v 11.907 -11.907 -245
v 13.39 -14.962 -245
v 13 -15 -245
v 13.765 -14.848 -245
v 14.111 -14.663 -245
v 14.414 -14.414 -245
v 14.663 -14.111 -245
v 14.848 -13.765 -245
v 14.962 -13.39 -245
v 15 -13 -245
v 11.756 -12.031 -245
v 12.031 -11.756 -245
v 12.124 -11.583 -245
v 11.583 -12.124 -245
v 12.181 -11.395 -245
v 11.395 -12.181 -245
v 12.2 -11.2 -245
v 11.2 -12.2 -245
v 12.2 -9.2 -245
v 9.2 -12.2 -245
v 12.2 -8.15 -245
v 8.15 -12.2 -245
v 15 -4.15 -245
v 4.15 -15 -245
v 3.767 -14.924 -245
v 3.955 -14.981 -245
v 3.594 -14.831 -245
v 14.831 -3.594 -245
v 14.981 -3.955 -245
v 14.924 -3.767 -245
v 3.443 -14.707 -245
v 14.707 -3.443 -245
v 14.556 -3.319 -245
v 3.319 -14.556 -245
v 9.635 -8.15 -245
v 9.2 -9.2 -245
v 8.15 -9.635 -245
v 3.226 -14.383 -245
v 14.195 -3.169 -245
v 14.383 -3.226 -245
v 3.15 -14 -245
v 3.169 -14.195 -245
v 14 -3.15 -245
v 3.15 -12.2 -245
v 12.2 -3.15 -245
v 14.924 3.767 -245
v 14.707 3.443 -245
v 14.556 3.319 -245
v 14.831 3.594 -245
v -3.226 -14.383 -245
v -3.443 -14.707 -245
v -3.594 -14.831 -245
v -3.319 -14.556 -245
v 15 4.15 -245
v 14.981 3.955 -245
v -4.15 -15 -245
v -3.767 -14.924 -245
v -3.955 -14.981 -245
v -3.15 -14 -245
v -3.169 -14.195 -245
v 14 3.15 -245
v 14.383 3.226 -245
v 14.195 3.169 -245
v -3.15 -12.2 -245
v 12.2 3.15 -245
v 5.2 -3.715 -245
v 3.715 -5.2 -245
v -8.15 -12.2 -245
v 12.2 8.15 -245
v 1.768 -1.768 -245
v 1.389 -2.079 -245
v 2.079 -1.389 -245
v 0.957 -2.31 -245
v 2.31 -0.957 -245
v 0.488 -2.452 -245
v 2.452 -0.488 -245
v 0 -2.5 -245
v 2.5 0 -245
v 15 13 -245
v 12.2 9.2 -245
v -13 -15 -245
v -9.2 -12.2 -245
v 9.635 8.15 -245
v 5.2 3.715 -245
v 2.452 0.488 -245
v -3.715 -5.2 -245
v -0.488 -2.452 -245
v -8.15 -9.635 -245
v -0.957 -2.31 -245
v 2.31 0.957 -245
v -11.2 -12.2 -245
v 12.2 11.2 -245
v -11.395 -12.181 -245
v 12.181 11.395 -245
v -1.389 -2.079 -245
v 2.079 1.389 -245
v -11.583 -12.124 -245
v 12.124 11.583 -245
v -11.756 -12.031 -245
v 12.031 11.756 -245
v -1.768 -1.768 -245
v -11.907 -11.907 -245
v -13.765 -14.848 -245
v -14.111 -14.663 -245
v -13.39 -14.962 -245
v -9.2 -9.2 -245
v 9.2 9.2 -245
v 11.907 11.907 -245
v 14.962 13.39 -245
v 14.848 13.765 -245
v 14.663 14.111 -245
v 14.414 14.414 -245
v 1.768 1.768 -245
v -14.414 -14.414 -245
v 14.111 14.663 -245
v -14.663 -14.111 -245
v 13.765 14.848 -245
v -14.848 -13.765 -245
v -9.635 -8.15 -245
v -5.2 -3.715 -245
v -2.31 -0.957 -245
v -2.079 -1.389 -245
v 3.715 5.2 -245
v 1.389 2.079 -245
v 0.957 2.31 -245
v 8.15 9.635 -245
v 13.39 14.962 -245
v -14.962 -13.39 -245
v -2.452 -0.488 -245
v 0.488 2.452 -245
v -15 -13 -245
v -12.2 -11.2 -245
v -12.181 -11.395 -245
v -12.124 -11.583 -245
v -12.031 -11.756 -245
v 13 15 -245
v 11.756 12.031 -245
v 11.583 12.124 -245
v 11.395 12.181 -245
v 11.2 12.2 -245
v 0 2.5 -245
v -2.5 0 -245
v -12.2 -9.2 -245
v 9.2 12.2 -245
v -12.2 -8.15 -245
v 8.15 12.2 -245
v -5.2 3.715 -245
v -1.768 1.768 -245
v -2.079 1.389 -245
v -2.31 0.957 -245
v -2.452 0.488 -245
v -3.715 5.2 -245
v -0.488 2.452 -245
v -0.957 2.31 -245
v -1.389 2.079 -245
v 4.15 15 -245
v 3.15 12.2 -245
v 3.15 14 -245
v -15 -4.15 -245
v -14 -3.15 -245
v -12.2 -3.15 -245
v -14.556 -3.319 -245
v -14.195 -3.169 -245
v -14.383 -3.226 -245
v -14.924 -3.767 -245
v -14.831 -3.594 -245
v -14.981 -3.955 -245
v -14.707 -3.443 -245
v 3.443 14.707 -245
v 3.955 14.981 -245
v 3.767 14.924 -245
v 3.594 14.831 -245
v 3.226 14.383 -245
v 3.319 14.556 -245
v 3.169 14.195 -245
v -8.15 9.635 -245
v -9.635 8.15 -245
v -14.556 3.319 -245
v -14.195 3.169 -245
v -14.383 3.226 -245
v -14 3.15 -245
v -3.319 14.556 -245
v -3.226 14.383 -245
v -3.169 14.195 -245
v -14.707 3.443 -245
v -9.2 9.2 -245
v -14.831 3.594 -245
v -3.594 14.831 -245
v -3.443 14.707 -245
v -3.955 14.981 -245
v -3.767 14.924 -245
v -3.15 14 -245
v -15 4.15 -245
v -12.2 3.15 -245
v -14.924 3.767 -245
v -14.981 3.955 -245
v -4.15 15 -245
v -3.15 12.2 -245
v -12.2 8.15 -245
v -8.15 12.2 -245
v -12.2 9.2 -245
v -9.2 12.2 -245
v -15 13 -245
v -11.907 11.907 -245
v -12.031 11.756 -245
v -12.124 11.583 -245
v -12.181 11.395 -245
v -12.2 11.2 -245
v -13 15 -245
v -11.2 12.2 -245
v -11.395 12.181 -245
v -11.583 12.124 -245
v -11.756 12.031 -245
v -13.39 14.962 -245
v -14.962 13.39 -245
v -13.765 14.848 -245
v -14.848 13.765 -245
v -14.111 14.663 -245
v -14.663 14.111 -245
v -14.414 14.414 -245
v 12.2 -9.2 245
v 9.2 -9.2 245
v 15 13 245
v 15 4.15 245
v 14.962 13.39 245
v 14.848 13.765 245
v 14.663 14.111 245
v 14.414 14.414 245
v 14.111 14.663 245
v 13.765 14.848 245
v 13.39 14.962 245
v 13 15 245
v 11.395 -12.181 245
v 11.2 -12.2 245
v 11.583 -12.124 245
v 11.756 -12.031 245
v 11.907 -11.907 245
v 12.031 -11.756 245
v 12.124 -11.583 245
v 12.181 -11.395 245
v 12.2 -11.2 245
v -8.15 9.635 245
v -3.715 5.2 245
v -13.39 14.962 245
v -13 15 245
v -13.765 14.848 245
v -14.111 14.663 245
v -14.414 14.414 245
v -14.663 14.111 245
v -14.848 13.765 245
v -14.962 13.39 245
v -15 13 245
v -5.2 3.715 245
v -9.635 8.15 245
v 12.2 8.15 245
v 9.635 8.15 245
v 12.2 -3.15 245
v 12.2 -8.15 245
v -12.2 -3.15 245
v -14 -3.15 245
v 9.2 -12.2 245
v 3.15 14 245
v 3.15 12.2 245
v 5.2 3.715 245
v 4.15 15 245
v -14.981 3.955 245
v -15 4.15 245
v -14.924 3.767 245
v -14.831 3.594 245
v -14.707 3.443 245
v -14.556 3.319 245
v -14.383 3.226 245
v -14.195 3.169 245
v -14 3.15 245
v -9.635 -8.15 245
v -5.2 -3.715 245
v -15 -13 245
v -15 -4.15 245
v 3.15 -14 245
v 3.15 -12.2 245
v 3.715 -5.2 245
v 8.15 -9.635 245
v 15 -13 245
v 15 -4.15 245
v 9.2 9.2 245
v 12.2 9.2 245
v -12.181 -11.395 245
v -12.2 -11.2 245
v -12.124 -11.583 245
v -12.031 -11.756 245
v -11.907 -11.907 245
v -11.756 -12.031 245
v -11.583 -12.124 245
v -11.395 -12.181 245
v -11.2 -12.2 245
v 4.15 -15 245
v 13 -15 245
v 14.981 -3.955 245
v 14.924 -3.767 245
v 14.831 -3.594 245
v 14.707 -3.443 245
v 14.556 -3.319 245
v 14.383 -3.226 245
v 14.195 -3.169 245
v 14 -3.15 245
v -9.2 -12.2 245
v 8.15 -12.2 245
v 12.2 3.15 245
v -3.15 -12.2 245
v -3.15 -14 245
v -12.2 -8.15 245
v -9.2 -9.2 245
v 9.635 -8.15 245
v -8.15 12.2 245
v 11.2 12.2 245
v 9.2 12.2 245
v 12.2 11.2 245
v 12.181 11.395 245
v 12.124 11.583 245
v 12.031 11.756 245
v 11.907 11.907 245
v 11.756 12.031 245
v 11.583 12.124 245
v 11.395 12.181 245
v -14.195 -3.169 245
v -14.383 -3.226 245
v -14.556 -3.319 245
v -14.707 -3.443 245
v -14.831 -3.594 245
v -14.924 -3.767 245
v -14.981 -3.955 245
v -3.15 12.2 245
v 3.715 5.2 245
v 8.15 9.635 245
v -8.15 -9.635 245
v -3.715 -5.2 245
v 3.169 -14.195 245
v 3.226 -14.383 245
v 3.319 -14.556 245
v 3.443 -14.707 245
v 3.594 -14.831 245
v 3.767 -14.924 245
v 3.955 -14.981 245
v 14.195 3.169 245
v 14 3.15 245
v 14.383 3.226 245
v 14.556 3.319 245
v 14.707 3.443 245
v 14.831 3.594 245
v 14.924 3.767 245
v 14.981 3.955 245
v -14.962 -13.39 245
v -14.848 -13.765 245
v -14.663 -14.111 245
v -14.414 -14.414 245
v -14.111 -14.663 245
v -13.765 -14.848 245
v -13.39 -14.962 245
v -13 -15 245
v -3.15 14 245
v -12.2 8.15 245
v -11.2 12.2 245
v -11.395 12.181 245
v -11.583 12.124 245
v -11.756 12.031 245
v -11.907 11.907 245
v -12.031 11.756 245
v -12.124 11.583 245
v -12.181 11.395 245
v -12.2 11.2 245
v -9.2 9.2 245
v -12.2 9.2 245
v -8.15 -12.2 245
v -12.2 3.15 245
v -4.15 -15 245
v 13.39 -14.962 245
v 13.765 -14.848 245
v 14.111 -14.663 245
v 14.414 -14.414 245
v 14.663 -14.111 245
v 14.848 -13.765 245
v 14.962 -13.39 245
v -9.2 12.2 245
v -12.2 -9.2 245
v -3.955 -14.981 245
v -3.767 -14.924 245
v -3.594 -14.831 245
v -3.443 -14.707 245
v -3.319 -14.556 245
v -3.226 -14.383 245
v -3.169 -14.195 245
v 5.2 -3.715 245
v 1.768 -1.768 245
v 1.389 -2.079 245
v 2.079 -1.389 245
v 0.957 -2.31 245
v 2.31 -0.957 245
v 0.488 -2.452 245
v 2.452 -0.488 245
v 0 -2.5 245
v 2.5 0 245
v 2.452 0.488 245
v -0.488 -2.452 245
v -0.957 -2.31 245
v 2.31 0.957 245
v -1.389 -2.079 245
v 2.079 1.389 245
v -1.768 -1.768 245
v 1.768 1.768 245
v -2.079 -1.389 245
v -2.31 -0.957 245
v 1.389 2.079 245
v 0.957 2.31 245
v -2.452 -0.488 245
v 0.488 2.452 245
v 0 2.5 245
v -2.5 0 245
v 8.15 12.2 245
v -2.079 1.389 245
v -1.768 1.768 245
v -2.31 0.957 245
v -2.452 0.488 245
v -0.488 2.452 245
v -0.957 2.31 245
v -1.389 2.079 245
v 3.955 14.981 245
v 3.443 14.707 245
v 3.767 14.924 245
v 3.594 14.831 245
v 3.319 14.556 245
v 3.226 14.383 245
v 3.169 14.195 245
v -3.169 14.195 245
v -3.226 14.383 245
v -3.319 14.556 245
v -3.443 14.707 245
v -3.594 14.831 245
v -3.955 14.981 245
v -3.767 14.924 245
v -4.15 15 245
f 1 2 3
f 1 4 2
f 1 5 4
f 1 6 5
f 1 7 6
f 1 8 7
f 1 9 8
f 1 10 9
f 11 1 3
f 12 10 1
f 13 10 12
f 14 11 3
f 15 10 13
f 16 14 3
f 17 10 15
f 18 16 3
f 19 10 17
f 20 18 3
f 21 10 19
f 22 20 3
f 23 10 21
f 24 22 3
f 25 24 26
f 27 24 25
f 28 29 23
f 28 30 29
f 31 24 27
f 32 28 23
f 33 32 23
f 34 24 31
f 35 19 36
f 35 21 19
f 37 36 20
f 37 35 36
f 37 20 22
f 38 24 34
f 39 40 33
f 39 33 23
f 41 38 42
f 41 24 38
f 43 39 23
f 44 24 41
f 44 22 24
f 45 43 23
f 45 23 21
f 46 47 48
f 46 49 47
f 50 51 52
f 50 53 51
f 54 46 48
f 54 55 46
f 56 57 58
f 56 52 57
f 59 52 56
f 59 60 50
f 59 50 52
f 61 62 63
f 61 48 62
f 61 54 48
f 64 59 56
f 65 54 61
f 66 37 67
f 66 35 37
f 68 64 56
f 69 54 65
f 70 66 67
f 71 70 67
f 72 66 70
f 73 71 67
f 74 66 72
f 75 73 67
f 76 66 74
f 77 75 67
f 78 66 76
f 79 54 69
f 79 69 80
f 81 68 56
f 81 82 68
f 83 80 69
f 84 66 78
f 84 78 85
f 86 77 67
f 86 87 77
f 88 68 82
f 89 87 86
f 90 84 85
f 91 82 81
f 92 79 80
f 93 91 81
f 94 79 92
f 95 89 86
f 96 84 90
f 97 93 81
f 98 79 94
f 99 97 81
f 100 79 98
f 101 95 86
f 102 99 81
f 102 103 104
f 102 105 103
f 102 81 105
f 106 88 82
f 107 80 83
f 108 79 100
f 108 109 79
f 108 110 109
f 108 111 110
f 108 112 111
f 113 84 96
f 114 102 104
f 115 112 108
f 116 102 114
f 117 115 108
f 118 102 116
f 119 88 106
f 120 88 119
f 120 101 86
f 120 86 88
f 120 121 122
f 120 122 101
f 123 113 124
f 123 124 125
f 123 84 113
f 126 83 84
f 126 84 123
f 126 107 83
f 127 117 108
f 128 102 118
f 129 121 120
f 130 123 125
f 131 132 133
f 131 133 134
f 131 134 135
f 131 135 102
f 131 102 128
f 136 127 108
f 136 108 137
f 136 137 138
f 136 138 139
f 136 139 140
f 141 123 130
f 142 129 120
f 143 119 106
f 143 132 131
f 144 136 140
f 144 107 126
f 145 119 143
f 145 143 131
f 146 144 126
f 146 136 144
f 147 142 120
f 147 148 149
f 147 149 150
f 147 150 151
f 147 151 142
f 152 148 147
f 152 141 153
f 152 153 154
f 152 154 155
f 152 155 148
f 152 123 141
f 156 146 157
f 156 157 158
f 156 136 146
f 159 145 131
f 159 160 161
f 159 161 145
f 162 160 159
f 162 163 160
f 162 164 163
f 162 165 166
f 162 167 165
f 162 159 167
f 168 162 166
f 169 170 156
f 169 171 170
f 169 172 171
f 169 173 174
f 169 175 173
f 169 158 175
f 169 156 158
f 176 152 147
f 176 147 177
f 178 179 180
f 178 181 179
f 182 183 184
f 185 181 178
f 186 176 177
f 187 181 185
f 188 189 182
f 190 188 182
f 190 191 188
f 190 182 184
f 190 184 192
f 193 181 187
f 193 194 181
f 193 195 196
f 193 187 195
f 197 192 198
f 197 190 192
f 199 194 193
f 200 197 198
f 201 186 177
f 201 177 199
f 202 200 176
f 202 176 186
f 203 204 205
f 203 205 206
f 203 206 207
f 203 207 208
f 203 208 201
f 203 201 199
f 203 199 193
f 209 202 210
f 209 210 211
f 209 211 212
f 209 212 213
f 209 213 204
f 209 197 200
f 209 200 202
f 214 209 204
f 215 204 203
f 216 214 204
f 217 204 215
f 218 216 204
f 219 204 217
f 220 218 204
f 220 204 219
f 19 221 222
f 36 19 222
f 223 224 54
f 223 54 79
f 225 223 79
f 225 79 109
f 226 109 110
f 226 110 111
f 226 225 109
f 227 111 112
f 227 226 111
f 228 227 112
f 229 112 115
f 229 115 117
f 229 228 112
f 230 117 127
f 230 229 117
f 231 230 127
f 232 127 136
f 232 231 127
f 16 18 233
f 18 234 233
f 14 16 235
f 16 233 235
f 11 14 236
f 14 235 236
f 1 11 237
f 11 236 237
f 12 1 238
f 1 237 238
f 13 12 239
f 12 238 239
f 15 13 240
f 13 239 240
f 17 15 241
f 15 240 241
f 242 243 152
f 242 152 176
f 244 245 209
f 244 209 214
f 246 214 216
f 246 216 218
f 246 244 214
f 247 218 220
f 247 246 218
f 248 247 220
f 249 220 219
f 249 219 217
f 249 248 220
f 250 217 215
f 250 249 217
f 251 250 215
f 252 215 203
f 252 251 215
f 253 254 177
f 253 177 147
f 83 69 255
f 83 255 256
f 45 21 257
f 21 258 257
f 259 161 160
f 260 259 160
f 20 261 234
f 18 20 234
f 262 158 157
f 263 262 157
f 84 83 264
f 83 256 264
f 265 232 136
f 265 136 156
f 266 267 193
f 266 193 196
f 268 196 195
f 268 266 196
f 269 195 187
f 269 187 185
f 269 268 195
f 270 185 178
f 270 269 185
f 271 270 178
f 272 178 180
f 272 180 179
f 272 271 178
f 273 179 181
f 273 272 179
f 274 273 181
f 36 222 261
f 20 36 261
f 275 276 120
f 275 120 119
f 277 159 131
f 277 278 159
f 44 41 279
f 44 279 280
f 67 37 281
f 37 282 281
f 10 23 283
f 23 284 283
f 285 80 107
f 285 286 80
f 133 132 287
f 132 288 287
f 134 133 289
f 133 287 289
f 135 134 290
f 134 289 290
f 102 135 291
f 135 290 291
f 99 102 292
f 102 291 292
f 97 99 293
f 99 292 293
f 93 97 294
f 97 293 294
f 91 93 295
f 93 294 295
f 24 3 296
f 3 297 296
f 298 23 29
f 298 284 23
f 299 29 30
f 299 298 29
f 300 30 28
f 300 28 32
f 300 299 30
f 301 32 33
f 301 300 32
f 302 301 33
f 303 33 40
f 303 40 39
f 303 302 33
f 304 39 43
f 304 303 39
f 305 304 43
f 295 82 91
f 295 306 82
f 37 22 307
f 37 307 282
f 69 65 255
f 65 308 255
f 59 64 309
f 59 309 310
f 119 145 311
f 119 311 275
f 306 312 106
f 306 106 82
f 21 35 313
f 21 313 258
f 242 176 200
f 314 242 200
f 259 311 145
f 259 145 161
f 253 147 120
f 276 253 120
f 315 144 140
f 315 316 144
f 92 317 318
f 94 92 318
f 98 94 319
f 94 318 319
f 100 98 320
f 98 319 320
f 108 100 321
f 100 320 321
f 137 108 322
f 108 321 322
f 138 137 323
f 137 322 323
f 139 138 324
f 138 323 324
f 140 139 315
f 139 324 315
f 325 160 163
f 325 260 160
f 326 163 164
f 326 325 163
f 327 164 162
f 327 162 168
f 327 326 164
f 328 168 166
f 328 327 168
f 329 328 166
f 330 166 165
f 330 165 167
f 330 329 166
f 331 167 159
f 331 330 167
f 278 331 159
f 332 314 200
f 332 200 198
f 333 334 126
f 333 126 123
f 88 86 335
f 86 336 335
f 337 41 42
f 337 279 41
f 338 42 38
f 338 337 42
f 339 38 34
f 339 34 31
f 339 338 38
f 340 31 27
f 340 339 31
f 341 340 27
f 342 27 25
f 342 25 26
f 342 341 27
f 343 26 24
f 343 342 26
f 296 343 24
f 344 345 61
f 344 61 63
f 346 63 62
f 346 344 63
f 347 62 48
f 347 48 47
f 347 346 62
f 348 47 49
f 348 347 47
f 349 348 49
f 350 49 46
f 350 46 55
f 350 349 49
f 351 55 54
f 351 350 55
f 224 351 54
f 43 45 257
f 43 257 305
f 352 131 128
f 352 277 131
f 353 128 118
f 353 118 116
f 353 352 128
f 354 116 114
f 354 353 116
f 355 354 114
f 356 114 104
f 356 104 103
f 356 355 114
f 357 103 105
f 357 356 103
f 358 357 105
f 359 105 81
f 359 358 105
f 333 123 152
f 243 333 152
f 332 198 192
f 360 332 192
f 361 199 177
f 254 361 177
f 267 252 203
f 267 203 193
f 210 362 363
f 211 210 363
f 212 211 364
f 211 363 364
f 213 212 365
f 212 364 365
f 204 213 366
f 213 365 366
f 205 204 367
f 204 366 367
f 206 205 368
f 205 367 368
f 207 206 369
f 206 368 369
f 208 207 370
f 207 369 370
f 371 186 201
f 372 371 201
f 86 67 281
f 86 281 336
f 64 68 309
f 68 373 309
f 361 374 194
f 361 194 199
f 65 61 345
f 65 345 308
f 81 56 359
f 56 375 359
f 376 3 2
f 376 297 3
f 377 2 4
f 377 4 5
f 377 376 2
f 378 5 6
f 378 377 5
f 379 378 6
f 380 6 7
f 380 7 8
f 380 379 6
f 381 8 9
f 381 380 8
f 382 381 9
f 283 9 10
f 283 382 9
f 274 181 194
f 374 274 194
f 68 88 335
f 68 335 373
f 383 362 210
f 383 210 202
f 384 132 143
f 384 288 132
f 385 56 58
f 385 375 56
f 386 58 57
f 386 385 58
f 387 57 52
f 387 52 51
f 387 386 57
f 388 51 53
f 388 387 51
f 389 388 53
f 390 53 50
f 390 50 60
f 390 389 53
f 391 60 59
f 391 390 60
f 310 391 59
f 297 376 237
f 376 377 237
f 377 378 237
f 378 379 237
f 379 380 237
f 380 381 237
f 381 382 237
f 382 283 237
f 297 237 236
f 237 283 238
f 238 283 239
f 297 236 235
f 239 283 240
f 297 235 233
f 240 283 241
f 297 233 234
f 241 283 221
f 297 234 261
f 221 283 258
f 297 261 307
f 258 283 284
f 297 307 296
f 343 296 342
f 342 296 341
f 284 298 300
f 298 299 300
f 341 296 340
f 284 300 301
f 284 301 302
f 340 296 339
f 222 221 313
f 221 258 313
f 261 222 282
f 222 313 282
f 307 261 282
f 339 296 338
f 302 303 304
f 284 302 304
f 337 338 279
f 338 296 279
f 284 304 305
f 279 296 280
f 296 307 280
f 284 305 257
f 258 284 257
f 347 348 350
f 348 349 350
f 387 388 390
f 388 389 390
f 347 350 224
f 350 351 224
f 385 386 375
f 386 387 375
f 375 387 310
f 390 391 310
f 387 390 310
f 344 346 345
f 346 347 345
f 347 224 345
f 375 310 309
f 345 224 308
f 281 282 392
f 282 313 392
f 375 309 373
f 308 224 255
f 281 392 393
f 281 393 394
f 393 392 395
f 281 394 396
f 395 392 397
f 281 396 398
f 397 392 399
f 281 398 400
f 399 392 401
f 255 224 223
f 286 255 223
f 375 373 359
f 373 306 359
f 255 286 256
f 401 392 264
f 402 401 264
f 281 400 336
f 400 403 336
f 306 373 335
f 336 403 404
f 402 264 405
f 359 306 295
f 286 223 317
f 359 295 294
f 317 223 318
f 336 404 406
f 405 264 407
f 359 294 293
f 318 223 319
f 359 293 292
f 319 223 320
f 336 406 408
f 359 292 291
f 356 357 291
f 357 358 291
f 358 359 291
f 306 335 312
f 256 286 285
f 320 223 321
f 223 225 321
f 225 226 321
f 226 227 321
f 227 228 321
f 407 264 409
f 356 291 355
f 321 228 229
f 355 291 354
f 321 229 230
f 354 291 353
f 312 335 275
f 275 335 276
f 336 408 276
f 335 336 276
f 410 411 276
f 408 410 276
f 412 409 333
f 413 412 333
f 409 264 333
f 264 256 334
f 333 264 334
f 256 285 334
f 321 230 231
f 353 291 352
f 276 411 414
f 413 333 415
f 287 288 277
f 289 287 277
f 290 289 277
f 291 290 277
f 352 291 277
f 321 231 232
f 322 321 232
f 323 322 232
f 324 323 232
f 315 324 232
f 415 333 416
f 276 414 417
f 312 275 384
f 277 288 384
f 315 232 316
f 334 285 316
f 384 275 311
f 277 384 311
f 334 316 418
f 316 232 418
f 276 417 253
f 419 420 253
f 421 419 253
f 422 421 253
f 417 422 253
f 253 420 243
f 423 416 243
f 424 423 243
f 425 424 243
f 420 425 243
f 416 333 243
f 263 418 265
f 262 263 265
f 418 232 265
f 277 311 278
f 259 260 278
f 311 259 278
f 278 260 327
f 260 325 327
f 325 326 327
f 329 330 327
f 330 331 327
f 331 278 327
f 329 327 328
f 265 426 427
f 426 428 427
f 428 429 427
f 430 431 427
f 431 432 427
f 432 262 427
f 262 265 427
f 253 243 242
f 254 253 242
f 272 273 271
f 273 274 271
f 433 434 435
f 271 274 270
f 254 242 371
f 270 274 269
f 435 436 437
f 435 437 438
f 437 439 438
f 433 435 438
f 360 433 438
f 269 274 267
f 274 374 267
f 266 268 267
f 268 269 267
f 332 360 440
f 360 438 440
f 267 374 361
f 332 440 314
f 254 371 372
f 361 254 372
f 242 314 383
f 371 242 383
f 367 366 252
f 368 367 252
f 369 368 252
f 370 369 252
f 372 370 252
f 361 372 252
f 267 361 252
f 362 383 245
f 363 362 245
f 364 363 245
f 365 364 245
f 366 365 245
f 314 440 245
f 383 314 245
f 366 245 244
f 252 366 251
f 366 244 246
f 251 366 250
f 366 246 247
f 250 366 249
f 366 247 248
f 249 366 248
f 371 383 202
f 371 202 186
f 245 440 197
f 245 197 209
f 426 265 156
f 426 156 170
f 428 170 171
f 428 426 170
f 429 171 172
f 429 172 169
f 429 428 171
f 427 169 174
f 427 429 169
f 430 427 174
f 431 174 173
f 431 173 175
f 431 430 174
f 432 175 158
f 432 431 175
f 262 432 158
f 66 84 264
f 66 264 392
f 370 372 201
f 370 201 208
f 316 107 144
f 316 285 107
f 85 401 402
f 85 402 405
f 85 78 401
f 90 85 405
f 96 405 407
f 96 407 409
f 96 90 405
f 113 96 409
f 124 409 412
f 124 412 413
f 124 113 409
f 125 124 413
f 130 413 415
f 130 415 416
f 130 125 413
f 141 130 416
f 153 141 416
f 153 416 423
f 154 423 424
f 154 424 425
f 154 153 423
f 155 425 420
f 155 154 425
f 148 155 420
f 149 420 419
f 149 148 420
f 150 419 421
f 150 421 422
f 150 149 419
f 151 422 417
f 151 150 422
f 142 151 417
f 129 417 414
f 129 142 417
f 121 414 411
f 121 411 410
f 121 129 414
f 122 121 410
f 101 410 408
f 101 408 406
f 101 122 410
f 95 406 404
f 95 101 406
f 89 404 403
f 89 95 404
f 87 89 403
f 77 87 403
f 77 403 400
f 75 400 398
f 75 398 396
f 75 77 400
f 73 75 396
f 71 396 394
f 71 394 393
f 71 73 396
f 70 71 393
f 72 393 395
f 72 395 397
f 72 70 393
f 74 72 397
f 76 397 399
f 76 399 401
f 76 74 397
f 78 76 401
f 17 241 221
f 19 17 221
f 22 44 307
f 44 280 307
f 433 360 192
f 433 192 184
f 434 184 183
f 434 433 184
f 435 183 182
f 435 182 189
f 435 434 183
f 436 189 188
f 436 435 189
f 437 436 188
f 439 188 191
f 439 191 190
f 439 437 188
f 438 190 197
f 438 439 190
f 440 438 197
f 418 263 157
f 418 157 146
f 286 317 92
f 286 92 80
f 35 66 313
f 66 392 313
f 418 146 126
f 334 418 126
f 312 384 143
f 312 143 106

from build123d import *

# Parameters (mm, degrees)
SKETCH_R  = 2.5
PAD_DEPTH = 245


with BuildPart() as part:
    # Sketch → Pad (new body, symmetric)
    with BuildSketch(Plane.XY):
        with BuildLine():
            Line((14, 3.15), (12.2, 3.15))
            Line((12.2, 3.15), (12.2, 8.15))
            Line((12.2, 8.15), (9.634924, 8.15))
            Line((9.634924, 8.15), (5.2, 3.715076))
            Line((5.2, 3.715076), (5.2, -3.715076))
            Line((5.2, -3.715076), (9.634924, -8.15))
            Line((9.634924, -8.15), (12.2, -8.15))
            Line((12.2, -8.15), (12.2, -3.15))
            Line((12.2, -3.15), (14, -3.15))
            ThreePointArc((15, -4.15), (14.707107, -3.442893), (14, -3.15))
            Line((15, -4.15), (15, -13))
            ThreePointArc((13, -15), (14.414214, -14.414214), (15, -13))
            Line((13, -15), (4.15, -15))
            ThreePointArc((3.15, -14), (3.442893, -14.707107), (4.15, -15))
            Line((3.15, -14), (3.15, -12.2))
            Line((3.15, -12.2), (8.15, -12.2))
            Line((8.15, -12.2), (8.15, -9.634924))
            Line((8.15, -9.634924), (3.715076, -5.2))
            Line((3.715076, -5.2), (-3.715076, -5.2))
            Line((-3.715076, -5.2), (-8.15, -9.634924))
            Line((-8.15, -9.634924), (-8.15, -12.2))
            Line((-8.15, -12.2), (-3.15, -12.2))
            Line((-3.15, -12.2), (-3.15, -14))
            ThreePointArc((-4.15, -15), (-3.442893, -14.707107), (-3.15, -14))
            Line((-4.15, -15), (-13, -15))
            ThreePointArc((-15, -13), (-14.414214, -14.414214), (-13, -15))
            Line((-15, -4.15), (-15, -13))
            ThreePointArc((-14, -3.15), (-14.707107, -3.442893), (-15, -4.15))
            Line((-12.2, -3.15), (-14, -3.15))
            Line((-12.2, -8.15), (-12.2, -3.15))
            Line((-12.2, -8.15), (-9.634924, -8.15))
            Line((-5.2, -3.715076), (-9.634924, -8.15))
            Line((-5.2, 3.715076), (-5.2, -3.715076))
            Line((-9.634924, 8.15), (-5.2, 3.715076))
            Line((-12.2, 8.15), (-9.634924, 8.15))
            Line((-12.2, 3.15), (-12.2, 8.15))
            Line((-14, 3.15), (-12.2, 3.15))
            ThreePointArc((-15, 4.15), (-14.707107, 3.442893), (-14, 3.15))
            Line((-15, 13), (-15, 4.15))
            ThreePointArc((-13, 15), (-14.414214, 14.414214), (-15, 13))
            Line((-4.15, 15), (-13, 15))
            ThreePointArc((-3.15, 14), (-3.442893, 14.707107), (-4.15, 15))
            Line((-3.15, 12.2), (-3.15, 14))
            Line((-8.15, 12.2), (-3.15, 12.2))
            Line((-8.15, 9.634924), (-8.15, 12.2))
            Line((-3.715076, 5.2), (-8.15, 9.634924))
            Line((3.715076, 5.2), (-3.715076, 5.2))
            Line((8.15, 9.634924), (3.715076, 5.2))
            Line((8.15, 12.2), (8.15, 9.634924))
            Line((3.15, 12.2), (8.15, 12.2))
            Line((3.15, 14), (3.15, 12.2))
            ThreePointArc((4.15, 15), (3.442893, 14.707107), (3.15, 14))
            Line((13, 15), (4.15, 15))
            ThreePointArc((15, 13), (14.414214, 14.414214), (13, 15))
            Line((15, 4.15), (15, 13))
            ThreePointArc((14, 3.15), (14.707107, 3.442893), (15, 4.15))
        make_face()
        Circle(SKETCH_R, mode=Mode.SUBTRACT)
        with BuildLine():
            Line((9.2, 12.2), (11.2, 12.2))
            ThreePointArc((12.2, 11.2), (11.907107, 11.907107), (11.2, 12.2))
            Line((12.2, 11.2), (12.2, 9.2))
            Line((12.2, 9.2), (9.2, 9.2))
            Line((9.2, 9.2), (9.2, 12.2))
        make_face(mode=Mode.SUBTRACT)
        with BuildLine():
            ThreePointArc((-11.2, 12.2), (-11.907107, 11.907107), (-12.2, 11.2))
            Line((-12.2, 9.2), (-12.2, 11.2))
            Line((-9.2, 9.2), (-12.2, 9.2))
            Line((-9.2, 12.2), (-9.2, 9.2))
            Line((-11.2, 12.2), (-9.2, 12.2))
        make_face(mode=Mode.SUBTRACT)
        with BuildLine():
            ThreePointArc((-12.2, -11.2), (-11.907107, -11.907107), (-11.2, -12.2))
            Line((-9.2, -12.2), (-11.2, -12.2))
            Line((-9.2, -9.2), (-9.2, -12.2))
            Line((-12.2, -9.2), (-9.2, -9.2))
            Line((-12.2, -11.2), (-12.2, -9.2))
        make_face(mode=Mode.SUBTRACT)
        with BuildLine():
            ThreePointArc((11.2, -12.2), (11.907107, -11.907107), (12.2, -11.2))
            Line((12.2, -11.2), (12.2, -9.2))
            Line((12.2, -9.2), (9.2, -9.2))
            Line((9.2, -9.2), (9.2, -12.2))
            Line((9.2, -12.2), (11.2, -12.2))
        make_face(mode=Mode.SUBTRACT)
    extrude(amount=PAD_DEPTH, both=True)


solid = part.part
